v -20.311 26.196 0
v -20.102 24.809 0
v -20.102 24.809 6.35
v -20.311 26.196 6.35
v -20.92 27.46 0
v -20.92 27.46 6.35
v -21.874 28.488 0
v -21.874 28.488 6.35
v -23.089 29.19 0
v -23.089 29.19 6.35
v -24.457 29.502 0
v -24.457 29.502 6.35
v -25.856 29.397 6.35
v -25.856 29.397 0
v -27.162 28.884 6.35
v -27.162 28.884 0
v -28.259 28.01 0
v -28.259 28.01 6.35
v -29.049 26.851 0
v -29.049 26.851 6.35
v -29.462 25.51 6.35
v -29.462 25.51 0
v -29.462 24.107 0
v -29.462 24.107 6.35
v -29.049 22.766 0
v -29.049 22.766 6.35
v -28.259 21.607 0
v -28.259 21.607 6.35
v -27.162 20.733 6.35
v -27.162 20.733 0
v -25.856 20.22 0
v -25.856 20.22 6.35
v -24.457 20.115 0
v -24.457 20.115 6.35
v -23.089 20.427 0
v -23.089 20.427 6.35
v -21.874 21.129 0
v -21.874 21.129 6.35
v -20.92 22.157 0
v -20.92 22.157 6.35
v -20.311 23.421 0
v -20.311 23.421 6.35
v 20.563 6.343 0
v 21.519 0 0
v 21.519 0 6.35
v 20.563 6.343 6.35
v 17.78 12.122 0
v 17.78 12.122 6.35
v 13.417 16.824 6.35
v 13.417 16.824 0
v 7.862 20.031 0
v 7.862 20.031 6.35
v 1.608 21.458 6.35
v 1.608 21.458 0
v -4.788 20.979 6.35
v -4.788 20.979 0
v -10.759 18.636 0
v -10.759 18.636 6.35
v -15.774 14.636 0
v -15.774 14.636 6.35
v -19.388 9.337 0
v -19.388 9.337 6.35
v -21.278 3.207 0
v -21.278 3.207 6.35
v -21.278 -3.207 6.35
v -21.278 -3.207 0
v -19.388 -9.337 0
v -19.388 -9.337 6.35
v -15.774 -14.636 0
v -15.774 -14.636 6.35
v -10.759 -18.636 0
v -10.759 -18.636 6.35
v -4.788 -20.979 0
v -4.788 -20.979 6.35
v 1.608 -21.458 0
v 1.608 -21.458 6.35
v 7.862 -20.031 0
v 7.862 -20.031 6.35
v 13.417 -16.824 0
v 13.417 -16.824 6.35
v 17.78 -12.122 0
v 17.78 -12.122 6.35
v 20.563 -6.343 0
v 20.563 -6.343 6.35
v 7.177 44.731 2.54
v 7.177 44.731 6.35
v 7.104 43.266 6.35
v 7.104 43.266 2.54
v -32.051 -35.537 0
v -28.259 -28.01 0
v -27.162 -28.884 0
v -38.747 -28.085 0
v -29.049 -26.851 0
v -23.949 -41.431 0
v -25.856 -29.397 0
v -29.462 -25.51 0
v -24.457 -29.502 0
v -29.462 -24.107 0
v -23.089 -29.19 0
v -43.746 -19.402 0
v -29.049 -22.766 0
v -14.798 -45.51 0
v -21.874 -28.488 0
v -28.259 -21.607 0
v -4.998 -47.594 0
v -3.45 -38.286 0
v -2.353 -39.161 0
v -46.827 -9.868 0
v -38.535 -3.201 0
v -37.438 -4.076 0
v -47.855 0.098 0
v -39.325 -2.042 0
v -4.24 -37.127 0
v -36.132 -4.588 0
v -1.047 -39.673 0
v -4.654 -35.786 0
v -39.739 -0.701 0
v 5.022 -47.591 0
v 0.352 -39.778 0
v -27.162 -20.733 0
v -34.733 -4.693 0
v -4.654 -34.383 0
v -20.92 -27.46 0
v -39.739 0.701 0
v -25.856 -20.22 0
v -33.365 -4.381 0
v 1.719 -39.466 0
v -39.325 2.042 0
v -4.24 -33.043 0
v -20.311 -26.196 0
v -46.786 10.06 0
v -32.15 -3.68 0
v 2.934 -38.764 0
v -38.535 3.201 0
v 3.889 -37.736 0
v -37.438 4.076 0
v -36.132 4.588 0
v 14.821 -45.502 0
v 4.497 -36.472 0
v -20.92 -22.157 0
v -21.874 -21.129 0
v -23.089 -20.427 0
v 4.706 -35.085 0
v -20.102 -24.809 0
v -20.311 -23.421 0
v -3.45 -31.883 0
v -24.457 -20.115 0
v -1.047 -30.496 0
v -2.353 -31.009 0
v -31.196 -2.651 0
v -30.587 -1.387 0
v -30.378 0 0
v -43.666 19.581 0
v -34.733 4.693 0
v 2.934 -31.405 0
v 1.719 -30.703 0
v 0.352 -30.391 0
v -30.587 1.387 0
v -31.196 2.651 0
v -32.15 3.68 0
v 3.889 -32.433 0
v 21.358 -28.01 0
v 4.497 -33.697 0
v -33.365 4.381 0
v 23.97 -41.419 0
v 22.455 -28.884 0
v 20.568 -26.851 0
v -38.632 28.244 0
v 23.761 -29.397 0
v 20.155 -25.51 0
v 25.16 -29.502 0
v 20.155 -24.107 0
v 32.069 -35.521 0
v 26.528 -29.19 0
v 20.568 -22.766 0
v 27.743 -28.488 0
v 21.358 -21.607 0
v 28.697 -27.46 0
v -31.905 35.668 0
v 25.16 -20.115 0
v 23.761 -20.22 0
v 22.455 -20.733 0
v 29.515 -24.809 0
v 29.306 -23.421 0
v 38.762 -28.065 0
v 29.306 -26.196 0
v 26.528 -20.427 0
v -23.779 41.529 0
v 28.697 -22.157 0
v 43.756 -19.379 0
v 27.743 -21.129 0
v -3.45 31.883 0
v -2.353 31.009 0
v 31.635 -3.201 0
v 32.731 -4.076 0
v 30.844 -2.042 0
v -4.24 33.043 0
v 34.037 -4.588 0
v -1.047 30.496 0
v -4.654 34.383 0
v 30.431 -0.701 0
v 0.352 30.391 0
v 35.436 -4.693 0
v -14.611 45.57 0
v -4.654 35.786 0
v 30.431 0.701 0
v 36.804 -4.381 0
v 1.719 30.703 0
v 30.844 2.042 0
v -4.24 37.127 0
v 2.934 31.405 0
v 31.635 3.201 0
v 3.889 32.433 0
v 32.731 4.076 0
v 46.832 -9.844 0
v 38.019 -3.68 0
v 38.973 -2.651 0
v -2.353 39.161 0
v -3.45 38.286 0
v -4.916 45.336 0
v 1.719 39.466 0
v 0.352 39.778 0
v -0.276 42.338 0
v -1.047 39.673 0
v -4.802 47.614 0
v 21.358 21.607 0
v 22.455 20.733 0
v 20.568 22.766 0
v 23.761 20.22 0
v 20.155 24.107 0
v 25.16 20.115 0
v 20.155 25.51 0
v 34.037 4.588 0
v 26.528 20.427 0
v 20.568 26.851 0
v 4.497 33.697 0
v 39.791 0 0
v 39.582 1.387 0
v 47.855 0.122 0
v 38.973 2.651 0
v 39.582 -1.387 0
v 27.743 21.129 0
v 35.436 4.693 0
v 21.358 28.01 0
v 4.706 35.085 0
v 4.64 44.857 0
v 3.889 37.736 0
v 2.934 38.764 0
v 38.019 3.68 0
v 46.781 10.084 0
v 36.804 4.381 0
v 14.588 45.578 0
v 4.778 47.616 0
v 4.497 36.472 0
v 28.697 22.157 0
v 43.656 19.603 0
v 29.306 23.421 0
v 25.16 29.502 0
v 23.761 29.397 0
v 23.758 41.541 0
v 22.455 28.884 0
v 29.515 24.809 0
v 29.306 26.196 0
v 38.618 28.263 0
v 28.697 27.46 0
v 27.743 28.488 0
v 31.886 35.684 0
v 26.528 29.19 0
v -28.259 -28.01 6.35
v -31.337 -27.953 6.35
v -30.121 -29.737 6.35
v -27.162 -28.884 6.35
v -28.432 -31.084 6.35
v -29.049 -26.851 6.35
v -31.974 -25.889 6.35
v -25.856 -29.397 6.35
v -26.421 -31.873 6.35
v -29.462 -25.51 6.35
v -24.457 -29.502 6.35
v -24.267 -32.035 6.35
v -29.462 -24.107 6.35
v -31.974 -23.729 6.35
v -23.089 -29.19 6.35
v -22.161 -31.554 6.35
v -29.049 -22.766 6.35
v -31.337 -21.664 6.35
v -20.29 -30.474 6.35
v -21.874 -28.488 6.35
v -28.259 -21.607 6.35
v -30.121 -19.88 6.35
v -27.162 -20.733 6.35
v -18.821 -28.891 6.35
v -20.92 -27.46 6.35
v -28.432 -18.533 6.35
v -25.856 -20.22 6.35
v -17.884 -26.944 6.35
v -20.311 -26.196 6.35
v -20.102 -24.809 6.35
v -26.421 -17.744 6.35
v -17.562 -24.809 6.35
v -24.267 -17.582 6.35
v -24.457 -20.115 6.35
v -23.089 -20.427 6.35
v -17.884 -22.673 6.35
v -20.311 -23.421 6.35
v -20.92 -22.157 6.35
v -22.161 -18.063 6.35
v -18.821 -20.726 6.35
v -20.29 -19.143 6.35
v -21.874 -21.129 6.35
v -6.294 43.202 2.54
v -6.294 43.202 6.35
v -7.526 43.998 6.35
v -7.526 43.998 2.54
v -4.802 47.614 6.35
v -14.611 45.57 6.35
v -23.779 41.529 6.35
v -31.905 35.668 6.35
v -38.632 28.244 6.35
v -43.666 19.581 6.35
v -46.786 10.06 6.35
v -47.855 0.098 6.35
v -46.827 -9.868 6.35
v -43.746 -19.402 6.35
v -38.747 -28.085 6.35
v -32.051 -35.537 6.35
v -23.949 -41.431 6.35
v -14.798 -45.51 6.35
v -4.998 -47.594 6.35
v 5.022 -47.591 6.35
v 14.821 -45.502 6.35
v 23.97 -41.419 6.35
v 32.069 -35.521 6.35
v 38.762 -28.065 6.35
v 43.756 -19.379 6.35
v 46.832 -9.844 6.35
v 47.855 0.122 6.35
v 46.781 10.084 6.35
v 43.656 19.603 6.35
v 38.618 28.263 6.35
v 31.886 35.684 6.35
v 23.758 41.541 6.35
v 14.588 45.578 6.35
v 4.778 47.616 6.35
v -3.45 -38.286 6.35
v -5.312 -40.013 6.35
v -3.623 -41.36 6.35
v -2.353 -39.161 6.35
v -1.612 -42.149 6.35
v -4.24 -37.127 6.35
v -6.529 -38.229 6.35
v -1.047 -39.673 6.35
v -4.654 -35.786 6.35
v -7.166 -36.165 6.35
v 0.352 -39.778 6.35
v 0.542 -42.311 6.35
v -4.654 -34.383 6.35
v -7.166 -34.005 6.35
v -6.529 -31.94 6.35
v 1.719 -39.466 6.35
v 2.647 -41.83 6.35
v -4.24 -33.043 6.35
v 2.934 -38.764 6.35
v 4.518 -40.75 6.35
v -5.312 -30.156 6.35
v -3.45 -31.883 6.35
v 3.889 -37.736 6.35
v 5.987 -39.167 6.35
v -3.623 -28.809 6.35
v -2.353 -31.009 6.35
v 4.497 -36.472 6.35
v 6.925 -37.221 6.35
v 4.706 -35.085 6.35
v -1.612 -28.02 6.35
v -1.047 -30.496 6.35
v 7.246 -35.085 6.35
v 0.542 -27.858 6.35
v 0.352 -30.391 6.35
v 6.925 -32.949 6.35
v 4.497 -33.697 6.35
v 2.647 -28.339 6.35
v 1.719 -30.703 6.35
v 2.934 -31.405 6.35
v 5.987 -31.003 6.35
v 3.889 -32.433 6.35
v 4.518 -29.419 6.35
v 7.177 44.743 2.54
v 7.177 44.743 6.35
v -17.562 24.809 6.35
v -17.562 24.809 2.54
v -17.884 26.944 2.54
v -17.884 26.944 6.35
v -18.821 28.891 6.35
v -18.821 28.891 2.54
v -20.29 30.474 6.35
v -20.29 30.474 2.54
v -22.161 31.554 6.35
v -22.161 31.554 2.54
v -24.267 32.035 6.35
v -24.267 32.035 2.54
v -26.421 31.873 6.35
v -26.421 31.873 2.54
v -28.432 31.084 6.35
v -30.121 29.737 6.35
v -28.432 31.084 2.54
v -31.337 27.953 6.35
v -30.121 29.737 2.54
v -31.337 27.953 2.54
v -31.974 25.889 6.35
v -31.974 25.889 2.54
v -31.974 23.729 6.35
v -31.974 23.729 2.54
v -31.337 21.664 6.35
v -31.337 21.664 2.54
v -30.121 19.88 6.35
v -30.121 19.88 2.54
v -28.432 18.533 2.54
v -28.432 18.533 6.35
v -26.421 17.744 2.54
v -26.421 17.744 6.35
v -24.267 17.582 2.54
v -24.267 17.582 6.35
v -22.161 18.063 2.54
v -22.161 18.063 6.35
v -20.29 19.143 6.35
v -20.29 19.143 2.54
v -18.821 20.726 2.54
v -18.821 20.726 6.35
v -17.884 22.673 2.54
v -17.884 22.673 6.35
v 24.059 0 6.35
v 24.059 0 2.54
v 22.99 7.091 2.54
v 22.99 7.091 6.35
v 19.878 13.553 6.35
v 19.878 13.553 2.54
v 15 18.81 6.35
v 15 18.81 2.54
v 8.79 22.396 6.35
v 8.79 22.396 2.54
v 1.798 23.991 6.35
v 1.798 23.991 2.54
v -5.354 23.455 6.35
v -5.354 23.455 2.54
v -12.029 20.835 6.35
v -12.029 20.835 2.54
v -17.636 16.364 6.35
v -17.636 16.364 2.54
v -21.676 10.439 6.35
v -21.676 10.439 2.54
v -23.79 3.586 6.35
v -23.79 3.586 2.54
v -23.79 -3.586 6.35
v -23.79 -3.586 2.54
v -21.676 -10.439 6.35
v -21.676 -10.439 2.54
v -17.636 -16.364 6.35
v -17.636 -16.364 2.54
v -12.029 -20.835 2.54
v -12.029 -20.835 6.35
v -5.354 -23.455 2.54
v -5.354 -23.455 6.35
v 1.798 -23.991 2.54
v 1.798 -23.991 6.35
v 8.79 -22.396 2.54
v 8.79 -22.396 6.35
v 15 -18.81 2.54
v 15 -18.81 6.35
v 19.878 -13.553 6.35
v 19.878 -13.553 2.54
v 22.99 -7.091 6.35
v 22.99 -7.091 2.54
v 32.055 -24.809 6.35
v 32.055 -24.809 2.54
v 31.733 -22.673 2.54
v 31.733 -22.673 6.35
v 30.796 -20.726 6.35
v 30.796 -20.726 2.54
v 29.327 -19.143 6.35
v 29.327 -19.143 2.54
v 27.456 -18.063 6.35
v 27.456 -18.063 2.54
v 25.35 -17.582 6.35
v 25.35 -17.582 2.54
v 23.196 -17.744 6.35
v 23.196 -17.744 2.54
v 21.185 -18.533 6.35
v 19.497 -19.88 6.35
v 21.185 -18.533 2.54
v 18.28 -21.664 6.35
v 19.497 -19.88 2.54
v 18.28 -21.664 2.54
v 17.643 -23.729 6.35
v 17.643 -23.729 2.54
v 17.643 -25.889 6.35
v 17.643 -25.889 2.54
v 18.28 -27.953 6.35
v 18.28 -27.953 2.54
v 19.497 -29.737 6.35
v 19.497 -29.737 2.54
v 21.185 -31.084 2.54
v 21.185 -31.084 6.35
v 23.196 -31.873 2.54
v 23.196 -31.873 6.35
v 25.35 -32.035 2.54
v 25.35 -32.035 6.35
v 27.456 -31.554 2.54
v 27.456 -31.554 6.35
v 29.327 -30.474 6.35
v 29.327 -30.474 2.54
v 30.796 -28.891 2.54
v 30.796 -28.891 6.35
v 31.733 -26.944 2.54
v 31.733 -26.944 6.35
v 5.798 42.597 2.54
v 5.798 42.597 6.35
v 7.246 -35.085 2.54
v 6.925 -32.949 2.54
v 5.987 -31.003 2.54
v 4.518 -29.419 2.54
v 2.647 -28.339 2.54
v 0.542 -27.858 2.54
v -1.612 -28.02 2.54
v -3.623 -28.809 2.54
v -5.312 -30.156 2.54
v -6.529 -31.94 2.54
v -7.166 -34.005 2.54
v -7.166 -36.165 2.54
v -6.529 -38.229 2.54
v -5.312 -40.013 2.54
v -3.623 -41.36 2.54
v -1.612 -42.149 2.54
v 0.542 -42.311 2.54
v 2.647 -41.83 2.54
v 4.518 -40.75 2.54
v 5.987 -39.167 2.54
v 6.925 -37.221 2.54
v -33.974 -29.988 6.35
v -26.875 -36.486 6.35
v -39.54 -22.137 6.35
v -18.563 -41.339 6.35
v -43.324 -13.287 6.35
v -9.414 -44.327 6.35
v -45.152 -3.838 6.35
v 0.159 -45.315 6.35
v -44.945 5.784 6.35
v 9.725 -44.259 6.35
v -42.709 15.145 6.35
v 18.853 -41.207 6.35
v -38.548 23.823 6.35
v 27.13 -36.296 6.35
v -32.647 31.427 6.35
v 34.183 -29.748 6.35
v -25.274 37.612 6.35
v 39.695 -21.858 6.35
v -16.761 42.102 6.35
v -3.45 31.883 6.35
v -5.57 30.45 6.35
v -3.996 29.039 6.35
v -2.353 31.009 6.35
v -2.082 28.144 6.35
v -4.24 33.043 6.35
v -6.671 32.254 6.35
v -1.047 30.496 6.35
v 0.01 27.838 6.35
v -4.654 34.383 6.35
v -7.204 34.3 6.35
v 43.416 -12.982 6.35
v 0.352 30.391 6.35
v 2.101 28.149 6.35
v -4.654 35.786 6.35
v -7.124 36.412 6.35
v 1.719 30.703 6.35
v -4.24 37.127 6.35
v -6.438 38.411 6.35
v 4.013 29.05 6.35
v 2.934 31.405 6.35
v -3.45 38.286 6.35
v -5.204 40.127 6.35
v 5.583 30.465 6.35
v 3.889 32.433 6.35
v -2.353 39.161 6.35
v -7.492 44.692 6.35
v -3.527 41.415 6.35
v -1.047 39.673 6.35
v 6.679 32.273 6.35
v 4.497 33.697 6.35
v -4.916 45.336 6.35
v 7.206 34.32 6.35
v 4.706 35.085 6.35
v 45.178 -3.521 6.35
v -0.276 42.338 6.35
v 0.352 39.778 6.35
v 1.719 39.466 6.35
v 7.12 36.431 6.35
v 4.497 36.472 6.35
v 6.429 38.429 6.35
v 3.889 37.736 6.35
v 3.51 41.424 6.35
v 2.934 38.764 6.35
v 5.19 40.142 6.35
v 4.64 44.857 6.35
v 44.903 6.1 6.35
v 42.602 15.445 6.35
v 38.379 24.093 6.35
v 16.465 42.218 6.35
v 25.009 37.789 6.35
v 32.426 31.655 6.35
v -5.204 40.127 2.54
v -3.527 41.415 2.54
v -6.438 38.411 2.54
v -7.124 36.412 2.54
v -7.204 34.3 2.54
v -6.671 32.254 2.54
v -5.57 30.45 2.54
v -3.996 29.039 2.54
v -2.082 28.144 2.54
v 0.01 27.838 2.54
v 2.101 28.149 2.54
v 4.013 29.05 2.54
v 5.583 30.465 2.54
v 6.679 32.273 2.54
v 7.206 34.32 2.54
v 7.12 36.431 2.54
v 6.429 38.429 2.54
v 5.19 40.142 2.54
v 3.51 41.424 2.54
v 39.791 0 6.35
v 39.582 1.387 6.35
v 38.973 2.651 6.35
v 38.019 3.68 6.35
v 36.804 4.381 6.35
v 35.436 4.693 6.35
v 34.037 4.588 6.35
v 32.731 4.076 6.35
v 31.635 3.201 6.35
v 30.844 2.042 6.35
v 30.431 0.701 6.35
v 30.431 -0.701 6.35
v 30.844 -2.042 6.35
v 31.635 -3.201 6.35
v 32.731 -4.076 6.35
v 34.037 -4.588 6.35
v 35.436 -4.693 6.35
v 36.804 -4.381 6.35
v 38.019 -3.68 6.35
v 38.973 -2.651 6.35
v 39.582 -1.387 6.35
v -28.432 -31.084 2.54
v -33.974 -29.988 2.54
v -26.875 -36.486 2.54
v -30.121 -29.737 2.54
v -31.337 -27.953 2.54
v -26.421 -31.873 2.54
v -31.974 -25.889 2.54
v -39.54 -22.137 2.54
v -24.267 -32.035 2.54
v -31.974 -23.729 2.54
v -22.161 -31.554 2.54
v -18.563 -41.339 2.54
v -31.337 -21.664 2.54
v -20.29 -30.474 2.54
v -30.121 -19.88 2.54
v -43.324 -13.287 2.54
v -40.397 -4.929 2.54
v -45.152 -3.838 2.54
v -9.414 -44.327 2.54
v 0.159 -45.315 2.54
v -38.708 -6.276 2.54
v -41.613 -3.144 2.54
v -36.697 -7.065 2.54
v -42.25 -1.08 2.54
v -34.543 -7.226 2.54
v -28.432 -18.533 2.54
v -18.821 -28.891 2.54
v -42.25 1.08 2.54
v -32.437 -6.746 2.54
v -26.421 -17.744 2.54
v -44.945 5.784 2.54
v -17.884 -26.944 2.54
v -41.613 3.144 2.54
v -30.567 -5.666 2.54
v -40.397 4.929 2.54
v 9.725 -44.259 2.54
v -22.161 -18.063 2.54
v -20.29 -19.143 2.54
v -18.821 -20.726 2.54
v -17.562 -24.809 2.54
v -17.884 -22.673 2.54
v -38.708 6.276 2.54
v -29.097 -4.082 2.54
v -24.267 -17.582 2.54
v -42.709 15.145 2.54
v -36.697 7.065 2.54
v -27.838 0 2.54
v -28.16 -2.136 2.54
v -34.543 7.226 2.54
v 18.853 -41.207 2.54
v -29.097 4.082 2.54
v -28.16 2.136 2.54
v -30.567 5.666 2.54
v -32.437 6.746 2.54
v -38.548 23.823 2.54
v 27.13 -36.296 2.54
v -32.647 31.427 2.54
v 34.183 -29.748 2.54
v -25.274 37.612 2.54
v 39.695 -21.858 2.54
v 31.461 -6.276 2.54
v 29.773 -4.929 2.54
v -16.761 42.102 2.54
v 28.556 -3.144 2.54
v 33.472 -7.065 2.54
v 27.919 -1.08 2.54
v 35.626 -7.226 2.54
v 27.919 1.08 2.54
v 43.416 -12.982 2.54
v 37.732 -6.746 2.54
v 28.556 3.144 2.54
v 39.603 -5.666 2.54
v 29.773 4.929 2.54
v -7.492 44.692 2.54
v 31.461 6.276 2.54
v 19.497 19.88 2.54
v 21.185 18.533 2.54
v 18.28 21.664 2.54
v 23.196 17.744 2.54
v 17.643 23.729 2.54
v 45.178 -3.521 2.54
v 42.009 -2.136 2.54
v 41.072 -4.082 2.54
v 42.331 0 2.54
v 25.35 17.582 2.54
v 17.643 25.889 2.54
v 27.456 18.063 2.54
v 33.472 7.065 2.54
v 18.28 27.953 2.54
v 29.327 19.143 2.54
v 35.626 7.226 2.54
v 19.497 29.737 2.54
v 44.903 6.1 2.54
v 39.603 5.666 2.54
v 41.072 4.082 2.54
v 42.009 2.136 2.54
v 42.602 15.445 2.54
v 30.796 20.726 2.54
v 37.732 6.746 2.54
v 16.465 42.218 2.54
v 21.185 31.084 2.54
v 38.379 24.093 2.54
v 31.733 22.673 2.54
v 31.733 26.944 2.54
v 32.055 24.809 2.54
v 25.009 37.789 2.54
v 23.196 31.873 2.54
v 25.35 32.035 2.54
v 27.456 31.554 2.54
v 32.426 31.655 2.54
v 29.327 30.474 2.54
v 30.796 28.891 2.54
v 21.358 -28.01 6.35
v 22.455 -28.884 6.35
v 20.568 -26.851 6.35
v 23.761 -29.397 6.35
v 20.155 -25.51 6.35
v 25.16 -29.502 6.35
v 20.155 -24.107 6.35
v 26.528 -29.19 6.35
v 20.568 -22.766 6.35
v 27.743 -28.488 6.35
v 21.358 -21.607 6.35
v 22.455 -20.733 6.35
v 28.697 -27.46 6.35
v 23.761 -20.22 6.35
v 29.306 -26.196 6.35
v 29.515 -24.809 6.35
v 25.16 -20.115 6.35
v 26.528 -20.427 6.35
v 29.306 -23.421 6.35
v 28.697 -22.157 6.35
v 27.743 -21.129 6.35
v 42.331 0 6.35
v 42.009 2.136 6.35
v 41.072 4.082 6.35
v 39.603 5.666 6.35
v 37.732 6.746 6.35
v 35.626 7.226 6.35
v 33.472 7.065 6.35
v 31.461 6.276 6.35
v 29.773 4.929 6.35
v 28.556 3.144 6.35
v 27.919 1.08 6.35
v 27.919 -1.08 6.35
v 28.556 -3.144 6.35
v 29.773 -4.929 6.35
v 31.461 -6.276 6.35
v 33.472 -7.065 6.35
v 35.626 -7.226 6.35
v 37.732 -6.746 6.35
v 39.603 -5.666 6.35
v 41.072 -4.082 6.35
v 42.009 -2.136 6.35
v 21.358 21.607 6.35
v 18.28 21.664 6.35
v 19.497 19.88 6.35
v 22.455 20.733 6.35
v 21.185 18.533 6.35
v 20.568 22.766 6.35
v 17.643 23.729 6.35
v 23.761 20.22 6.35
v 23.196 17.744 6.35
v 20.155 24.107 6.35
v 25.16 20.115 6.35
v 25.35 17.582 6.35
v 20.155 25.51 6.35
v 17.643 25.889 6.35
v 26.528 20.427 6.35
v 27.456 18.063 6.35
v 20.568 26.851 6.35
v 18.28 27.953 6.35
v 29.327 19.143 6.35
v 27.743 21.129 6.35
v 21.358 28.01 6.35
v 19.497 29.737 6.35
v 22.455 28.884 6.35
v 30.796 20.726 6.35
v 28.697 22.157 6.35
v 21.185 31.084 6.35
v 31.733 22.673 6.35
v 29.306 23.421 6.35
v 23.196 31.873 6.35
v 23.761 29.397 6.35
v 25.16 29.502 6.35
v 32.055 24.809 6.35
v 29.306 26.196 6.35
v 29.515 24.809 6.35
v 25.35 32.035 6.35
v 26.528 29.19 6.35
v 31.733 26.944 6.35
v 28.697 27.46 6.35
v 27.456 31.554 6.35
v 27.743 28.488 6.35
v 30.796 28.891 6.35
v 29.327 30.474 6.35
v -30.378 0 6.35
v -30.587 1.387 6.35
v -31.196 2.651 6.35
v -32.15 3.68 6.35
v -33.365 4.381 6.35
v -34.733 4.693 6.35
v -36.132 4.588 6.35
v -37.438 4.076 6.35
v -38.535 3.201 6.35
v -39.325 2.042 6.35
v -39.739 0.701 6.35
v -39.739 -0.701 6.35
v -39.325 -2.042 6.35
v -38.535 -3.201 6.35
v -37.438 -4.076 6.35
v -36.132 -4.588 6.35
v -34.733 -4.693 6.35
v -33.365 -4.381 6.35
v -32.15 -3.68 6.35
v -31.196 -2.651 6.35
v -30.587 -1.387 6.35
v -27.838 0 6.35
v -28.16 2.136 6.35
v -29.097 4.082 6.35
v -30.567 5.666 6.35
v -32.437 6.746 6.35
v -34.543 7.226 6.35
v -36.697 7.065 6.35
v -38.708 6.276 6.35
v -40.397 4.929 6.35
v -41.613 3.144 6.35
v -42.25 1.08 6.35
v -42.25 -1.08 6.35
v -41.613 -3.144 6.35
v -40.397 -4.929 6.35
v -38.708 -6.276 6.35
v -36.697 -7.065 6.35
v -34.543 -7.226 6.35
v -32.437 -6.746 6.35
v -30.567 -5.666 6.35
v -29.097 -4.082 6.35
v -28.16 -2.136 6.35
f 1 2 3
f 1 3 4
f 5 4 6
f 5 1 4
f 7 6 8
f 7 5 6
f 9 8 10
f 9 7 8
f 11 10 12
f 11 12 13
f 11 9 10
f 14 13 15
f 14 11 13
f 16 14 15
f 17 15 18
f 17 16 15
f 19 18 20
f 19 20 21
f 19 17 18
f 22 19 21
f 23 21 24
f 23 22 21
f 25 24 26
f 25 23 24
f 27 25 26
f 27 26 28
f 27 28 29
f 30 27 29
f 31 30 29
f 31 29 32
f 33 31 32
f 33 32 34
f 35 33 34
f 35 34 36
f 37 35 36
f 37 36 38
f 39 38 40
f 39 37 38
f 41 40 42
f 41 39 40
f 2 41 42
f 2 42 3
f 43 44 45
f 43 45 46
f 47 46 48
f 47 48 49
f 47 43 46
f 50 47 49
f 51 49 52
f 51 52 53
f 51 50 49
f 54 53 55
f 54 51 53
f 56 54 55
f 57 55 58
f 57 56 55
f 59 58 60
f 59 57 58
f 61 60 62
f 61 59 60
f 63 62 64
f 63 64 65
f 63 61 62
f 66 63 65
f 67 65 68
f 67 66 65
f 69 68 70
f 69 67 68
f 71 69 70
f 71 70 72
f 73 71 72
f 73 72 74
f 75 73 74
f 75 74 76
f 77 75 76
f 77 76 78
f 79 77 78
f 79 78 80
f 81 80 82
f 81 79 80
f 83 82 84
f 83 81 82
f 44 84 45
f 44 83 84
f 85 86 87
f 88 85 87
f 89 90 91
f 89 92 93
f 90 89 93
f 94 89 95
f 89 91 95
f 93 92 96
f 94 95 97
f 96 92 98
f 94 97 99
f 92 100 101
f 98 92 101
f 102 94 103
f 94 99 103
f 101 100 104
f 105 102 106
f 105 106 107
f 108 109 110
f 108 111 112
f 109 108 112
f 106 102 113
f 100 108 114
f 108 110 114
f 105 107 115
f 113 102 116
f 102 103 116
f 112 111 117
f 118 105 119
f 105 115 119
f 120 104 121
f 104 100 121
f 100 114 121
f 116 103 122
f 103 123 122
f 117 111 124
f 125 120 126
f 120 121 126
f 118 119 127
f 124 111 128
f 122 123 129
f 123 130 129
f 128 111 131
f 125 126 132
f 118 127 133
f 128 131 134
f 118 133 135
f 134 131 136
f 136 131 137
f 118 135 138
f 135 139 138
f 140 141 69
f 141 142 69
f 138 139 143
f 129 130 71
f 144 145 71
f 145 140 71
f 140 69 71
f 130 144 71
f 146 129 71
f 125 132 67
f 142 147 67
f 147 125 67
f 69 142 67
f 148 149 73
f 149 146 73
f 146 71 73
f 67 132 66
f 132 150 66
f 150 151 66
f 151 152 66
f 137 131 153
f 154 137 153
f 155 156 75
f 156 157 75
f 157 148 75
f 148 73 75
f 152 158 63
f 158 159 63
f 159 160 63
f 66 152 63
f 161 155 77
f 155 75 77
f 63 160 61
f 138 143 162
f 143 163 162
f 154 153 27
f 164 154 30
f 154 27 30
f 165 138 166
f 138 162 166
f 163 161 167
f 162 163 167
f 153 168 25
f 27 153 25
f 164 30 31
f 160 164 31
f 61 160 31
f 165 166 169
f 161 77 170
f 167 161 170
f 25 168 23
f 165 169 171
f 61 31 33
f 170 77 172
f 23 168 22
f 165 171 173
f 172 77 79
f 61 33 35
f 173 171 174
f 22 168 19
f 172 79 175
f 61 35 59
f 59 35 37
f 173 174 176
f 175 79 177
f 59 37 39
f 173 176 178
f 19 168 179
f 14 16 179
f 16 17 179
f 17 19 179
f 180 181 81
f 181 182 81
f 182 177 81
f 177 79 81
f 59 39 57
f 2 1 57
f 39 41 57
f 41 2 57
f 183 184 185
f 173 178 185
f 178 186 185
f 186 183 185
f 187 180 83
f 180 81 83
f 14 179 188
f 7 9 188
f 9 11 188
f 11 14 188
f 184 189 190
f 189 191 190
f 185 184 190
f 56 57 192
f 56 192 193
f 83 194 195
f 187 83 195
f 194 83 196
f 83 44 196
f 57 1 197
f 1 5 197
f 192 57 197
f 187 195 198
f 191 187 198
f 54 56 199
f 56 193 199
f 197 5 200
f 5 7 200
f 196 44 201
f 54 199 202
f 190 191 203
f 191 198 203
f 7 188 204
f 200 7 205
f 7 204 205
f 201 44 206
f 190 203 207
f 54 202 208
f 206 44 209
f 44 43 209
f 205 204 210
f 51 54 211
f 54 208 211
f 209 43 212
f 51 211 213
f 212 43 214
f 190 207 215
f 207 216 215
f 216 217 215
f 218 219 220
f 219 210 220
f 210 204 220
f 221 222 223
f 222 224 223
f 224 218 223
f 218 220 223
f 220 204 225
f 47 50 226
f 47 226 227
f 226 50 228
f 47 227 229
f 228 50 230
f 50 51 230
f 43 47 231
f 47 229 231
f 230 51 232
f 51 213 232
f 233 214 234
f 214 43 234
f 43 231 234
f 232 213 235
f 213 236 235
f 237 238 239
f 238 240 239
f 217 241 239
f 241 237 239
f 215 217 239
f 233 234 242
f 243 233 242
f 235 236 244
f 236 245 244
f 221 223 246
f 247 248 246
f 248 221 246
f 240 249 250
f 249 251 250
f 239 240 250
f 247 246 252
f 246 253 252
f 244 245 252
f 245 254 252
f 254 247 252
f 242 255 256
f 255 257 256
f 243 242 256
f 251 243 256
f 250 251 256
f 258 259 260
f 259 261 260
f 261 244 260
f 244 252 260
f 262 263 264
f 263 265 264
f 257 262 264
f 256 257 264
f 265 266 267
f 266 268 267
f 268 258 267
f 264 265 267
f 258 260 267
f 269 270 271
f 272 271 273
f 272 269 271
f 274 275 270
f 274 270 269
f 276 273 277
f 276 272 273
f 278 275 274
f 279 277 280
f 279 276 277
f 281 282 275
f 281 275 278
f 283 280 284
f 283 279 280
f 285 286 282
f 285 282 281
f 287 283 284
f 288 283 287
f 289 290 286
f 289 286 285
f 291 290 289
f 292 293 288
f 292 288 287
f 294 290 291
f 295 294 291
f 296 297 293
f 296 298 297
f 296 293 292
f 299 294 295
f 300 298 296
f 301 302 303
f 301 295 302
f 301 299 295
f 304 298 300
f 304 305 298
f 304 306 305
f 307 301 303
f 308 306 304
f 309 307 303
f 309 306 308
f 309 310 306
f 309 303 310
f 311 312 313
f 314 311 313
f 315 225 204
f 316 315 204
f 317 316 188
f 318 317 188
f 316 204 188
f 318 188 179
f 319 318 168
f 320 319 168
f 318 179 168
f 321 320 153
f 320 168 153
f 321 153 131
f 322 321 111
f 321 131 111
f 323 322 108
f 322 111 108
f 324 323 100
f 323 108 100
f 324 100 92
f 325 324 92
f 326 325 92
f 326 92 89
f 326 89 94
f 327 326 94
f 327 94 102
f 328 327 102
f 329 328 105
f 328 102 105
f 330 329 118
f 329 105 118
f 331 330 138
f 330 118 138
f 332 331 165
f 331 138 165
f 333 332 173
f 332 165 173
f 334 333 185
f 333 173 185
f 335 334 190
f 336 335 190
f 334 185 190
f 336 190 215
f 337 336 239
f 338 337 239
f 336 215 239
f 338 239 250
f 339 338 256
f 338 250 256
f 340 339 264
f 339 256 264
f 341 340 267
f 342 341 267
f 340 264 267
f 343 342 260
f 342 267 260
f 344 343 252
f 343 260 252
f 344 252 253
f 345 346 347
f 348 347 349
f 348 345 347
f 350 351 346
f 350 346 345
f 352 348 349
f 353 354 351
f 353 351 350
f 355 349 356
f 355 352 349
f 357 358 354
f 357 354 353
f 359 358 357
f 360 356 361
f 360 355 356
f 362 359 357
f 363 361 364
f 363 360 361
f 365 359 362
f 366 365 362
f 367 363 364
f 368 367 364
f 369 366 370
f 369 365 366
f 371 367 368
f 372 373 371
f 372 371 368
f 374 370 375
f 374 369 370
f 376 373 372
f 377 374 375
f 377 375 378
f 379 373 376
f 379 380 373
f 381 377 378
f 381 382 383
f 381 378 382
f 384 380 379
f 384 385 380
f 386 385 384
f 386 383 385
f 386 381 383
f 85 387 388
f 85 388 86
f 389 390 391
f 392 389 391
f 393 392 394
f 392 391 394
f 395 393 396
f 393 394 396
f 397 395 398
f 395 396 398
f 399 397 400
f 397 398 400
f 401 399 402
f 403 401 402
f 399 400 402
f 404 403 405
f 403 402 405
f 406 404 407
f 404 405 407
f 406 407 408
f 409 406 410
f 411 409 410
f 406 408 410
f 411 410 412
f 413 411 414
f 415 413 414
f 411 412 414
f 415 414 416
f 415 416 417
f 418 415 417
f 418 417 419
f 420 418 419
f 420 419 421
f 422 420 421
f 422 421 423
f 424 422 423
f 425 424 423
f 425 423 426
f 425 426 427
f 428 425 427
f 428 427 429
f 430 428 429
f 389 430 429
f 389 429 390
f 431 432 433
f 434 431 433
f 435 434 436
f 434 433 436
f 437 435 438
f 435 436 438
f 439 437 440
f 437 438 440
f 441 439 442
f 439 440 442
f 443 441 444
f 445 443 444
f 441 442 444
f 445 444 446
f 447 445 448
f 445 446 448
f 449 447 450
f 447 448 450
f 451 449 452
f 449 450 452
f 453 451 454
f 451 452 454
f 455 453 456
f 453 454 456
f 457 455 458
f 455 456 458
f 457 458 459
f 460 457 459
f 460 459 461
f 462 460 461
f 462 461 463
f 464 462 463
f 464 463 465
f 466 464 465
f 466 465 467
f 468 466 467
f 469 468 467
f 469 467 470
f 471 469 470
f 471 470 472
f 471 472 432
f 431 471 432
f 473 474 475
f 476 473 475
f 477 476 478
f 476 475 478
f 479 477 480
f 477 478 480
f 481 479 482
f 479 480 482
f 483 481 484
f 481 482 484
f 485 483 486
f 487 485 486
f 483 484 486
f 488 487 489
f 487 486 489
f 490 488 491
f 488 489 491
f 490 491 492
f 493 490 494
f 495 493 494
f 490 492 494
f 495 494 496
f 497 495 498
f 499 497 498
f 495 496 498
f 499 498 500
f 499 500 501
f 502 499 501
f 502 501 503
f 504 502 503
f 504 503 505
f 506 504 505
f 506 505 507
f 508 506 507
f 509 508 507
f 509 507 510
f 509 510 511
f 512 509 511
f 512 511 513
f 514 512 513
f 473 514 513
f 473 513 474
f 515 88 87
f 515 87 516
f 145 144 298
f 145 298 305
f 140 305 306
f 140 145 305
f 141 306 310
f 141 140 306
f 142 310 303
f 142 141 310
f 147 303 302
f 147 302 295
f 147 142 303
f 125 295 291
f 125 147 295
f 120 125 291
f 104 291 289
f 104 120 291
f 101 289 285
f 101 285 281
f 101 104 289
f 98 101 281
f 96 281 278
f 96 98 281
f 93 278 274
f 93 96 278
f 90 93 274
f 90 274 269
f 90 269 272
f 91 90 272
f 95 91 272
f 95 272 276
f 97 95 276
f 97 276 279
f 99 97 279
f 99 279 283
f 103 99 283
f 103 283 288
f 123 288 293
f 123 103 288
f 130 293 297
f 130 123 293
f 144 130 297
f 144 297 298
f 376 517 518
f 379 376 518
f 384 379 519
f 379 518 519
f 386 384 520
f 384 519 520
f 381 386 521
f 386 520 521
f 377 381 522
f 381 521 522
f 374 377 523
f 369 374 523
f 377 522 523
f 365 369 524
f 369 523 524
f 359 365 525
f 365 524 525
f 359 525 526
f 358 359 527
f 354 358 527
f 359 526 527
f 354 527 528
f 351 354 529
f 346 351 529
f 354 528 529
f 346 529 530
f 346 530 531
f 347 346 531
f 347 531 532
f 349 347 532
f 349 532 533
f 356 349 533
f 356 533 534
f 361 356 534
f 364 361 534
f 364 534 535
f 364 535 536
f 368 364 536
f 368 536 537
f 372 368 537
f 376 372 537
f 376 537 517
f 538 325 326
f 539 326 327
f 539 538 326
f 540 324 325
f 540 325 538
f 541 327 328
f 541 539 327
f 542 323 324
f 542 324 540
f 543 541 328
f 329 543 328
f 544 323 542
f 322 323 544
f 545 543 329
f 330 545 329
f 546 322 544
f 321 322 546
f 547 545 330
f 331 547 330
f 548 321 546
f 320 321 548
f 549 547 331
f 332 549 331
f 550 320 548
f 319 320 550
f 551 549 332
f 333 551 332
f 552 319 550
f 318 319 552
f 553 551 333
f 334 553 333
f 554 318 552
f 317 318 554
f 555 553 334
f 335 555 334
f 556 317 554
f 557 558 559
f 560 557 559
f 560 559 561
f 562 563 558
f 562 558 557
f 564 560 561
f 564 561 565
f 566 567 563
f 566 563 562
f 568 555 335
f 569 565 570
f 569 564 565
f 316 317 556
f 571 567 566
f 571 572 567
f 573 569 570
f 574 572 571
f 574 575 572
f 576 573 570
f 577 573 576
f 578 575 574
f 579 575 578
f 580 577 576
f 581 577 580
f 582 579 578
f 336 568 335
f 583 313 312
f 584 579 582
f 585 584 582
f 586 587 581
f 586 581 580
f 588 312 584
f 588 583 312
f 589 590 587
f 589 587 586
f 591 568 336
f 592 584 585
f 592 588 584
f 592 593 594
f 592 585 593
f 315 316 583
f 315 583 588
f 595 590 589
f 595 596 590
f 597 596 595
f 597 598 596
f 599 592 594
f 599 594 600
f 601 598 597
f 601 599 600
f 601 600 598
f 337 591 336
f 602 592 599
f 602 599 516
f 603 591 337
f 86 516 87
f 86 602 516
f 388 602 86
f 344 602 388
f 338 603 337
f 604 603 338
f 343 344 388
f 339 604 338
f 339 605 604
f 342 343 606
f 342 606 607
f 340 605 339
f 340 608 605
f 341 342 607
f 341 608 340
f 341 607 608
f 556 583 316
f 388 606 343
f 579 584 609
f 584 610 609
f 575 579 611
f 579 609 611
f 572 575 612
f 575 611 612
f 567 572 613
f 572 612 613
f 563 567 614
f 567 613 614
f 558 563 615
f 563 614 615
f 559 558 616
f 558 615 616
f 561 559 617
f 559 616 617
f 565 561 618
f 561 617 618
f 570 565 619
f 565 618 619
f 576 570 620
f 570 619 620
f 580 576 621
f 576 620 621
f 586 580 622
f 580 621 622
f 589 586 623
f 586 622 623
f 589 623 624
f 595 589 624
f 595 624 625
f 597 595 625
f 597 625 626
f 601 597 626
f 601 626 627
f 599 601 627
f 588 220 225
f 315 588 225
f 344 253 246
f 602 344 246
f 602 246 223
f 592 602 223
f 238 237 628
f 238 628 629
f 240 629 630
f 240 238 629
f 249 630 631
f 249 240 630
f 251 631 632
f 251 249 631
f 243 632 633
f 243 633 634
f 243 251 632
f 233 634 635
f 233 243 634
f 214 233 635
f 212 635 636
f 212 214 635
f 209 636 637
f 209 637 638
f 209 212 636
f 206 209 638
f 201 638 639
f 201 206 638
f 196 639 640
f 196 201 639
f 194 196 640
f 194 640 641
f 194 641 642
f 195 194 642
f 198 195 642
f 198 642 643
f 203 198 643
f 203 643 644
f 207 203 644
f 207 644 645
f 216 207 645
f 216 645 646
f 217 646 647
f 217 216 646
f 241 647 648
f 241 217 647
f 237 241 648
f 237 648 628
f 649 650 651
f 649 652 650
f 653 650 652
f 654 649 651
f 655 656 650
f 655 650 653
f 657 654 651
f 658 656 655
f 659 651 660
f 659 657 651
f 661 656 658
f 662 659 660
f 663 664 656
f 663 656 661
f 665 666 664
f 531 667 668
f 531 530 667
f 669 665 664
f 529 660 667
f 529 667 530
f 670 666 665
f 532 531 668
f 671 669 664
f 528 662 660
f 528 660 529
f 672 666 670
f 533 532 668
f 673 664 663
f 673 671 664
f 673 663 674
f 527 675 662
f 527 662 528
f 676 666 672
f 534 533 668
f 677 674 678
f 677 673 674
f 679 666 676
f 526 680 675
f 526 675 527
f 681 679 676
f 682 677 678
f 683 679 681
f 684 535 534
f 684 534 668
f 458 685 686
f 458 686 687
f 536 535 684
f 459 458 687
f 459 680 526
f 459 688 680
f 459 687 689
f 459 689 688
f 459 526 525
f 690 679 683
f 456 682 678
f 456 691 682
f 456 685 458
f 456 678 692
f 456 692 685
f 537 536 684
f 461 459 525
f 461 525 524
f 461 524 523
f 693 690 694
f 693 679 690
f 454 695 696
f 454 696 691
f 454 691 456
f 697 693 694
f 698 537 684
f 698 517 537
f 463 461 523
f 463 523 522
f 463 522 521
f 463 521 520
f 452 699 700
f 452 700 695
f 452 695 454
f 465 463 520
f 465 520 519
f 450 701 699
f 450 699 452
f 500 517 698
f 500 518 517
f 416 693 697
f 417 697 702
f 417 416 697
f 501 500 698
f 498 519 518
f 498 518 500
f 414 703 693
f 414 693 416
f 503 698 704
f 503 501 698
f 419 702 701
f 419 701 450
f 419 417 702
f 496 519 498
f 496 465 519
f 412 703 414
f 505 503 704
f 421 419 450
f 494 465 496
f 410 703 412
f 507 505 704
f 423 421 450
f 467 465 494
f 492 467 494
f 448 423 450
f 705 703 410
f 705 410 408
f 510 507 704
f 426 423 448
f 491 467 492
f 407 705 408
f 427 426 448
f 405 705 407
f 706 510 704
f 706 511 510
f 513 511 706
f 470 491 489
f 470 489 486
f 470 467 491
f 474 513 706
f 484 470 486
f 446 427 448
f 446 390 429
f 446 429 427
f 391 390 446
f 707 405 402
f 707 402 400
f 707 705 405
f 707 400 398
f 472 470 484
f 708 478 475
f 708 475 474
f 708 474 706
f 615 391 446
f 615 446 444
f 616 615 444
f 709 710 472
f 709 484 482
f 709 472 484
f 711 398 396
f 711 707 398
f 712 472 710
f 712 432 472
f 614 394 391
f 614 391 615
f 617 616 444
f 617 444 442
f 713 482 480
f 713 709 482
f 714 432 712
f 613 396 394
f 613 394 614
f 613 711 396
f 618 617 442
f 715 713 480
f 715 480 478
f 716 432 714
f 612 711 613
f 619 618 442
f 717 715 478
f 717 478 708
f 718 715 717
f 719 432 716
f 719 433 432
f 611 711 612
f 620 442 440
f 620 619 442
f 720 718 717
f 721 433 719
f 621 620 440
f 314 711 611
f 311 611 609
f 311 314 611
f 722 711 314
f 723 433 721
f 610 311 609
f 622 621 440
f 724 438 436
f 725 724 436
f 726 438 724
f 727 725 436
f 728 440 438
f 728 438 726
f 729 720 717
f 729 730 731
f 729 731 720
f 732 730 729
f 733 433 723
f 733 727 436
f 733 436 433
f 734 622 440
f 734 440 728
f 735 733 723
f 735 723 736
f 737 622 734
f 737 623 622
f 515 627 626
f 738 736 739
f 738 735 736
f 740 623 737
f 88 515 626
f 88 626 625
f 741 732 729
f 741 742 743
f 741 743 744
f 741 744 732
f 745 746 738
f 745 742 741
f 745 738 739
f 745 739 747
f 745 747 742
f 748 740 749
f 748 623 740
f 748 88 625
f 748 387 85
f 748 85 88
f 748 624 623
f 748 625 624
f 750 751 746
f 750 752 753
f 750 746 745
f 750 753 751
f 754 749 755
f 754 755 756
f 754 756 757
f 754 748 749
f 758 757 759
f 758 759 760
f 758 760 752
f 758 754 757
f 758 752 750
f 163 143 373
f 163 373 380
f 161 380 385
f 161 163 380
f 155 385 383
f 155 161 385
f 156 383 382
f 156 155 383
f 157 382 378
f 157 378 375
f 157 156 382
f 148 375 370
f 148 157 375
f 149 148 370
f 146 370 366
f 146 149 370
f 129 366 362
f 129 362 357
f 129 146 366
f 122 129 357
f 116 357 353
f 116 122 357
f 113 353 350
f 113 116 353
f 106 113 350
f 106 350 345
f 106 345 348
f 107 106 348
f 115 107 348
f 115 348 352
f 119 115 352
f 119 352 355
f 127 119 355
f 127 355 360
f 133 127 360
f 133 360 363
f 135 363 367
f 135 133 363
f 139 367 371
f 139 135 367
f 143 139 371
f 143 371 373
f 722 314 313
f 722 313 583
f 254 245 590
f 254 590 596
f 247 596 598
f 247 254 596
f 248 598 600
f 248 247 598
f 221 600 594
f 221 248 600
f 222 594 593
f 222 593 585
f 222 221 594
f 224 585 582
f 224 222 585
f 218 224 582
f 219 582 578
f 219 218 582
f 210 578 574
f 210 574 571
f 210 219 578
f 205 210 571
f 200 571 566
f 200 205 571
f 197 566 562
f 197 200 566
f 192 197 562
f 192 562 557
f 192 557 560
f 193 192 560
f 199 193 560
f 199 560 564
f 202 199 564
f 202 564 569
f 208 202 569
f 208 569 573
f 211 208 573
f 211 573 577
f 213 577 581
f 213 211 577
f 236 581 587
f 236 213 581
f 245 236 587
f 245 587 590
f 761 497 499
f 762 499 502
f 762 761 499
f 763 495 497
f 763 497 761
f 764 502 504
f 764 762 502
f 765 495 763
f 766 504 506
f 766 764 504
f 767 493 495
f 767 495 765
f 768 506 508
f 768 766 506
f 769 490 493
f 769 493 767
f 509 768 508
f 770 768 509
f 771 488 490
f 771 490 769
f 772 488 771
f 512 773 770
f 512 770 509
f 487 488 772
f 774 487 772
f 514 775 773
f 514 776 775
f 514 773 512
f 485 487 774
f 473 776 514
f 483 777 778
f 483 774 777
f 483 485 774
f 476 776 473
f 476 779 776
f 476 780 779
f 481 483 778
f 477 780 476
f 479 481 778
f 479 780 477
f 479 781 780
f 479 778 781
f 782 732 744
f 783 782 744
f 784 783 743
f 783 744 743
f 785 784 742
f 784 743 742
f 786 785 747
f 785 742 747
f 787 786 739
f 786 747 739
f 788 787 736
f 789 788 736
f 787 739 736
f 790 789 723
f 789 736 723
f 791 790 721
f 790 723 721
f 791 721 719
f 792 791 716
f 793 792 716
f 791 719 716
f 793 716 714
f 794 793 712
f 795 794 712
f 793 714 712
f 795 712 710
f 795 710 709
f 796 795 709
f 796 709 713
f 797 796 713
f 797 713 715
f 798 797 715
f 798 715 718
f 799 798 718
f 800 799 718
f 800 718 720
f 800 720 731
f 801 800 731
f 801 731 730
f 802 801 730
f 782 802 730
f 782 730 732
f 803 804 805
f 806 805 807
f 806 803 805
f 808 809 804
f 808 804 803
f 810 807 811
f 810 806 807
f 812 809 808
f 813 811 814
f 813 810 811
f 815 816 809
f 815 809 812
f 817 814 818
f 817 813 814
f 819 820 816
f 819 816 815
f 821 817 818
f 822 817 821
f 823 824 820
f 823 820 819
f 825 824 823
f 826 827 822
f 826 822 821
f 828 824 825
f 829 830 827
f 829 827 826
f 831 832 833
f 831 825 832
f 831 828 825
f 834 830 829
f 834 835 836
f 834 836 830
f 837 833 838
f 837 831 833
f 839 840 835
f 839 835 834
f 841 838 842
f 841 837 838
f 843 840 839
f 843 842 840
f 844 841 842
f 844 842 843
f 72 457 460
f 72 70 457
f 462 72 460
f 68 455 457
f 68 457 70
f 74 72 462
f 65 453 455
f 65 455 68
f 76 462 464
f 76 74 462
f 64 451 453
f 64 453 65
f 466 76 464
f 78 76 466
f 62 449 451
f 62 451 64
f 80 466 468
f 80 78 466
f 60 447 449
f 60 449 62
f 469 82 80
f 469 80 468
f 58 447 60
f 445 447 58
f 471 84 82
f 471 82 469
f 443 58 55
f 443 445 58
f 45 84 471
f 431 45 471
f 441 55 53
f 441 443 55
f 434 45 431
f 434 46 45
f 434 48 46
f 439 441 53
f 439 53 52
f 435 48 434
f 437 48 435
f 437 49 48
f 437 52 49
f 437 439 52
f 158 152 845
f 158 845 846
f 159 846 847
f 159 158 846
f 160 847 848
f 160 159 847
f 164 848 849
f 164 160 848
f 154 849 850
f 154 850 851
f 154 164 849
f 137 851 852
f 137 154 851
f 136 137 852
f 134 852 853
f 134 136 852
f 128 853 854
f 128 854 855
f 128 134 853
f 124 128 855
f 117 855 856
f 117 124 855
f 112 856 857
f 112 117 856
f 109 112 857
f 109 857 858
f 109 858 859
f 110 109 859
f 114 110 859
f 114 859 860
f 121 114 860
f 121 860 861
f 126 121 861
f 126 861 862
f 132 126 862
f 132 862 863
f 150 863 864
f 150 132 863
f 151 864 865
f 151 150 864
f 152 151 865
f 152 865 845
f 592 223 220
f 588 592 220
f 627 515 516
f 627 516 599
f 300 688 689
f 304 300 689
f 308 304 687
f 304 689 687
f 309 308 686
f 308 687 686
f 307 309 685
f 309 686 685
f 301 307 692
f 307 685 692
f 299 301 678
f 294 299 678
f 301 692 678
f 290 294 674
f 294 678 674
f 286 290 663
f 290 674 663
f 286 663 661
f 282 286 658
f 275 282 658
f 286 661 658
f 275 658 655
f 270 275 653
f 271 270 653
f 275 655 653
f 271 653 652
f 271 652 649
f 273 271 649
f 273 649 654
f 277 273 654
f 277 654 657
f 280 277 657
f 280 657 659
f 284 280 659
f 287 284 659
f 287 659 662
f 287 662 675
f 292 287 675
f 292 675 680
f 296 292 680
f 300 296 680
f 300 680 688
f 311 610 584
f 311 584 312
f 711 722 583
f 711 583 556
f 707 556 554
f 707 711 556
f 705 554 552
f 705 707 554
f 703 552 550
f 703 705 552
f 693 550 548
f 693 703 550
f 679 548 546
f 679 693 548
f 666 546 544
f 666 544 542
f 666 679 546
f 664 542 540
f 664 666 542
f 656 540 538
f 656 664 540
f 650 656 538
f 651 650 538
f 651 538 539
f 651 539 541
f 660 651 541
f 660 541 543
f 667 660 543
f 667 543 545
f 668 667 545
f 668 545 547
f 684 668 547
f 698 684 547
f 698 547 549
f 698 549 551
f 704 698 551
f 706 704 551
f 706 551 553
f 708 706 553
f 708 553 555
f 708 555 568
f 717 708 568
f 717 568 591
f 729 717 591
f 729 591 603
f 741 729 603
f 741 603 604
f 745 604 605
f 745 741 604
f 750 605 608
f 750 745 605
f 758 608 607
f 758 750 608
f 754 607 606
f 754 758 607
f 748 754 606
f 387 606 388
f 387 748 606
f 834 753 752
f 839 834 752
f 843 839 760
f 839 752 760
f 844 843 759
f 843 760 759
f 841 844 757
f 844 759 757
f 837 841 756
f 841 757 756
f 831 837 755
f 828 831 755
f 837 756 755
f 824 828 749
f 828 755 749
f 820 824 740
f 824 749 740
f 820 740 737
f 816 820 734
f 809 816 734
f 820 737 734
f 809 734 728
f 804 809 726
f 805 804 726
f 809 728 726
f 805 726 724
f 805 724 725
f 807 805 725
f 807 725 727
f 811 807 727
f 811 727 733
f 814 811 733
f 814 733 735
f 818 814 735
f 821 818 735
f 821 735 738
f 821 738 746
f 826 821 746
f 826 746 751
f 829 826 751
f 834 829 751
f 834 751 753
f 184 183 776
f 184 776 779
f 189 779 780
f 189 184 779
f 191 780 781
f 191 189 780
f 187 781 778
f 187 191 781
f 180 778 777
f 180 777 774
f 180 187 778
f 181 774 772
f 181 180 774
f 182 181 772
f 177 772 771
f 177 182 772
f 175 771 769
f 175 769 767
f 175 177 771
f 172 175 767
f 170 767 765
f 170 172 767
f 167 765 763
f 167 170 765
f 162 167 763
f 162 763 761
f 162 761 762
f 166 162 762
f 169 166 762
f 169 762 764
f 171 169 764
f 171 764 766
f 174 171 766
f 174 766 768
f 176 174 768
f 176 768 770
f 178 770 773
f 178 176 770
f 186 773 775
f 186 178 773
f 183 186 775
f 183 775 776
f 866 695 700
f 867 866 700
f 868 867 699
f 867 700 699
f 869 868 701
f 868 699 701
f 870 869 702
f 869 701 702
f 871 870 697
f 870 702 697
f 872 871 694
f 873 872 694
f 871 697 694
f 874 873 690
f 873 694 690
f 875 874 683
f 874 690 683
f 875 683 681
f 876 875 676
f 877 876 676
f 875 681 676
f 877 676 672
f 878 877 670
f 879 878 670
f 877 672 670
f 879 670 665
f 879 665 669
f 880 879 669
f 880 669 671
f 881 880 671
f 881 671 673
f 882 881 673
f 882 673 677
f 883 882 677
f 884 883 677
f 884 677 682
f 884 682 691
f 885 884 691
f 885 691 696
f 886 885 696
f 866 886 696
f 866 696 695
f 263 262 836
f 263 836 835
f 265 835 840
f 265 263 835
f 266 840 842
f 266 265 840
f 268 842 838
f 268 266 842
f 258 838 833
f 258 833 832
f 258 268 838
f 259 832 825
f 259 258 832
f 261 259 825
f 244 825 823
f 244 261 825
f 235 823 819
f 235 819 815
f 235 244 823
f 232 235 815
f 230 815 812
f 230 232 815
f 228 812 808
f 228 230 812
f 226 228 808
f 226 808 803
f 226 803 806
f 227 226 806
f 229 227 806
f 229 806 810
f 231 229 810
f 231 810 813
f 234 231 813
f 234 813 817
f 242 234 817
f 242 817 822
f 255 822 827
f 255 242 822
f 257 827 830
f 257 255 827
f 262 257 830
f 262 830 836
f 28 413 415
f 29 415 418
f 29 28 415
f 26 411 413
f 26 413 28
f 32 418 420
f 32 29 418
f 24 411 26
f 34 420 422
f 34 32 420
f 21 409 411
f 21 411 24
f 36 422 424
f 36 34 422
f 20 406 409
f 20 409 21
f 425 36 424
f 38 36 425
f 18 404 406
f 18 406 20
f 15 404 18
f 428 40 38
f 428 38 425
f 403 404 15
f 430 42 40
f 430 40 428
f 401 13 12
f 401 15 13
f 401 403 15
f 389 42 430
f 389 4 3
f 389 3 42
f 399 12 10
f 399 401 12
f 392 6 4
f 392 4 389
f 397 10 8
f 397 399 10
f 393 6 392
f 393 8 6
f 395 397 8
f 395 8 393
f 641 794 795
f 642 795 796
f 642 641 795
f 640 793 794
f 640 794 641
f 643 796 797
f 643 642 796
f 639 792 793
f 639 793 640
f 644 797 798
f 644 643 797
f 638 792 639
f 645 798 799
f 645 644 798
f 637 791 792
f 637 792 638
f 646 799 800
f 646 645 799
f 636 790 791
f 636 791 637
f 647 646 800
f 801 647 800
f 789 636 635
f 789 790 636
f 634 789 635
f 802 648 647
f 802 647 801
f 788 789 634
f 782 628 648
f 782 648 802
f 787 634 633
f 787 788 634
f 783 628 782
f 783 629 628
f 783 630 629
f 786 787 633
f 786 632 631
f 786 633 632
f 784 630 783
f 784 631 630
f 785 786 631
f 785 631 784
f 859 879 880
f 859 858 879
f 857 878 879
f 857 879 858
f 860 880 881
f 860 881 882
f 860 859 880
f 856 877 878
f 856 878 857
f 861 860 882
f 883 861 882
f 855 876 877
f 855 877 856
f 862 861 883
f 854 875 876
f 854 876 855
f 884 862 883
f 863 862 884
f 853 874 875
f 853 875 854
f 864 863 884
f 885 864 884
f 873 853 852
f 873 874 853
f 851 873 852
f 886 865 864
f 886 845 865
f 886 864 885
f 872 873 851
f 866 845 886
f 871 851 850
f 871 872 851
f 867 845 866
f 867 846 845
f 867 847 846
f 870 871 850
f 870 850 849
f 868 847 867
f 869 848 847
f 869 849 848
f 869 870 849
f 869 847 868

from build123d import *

# Parameters (mm, degrees)
F0_R        = 4.7064707614
F0_R_2      = 21.5186597363
F1_DEPTH    = 6.35
F2_T        = 2.54
F2_T3_DEPTH = 11.43


# Not quite as in the source:
# - a shell that OpenCascade refuses in one call is made with other operations: the cavity is built on its own and cut out


with BuildPart() as f1:
    # F0 (on Top) → F1 (new body)
    with BuildSketch(Plane.XY):
        with BuildLine():
            Line((-4.9161130278, 45.3357483006), (-4.8021092029, 47.6136840266))
            ThreePointArc((-4.8021092029, 47.6136840266), (0.0120888652, -47.8552297376), (4.7780528964, 47.6161041025))
            Line((4.7780528964, 47.6161041025), (4.639992765, 44.8574939765))
            Line((4.639992765, 44.8574939765), (-0.2761202627, 42.3380110126))
            Line((-0.2761202627, 42.3380110126), (-4.9161130278, 45.3357483006))
        make_face()
        with Locations((-24.80855963, -24.80855963)):
            Circle(F0_R, mode=Mode.SUBTRACT)
        with Locations((0, -35.0846014917)):
            Circle(F0_R, mode=Mode.SUBTRACT)
        with Locations((24.80855963, -24.80855963)):
            Circle(F0_R, mode=Mode.SUBTRACT)
        with Locations((-35.0846014917, 0)):
            Circle(F0_R, mode=Mode.SUBTRACT)
        with Locations((-24.80855963, 24.80855963)):
            Circle(F0_R, mode=Mode.SUBTRACT)
        Circle(F0_R_2, mode=Mode.SUBTRACT)
        with Locations((35.0846014917, 0)):
            Circle(F0_R, mode=Mode.SUBTRACT)
        with Locations((0, 35.0846014917)):
            Circle(F0_R, mode=Mode.SUBTRACT)
        with Locations((24.80855963, 24.80855963)):
            Circle(F0_R, mode=Mode.SUBTRACT)
    extrude(amount=F1_DEPTH)

    # F2: shell of thickness 2.54, made by hand


with BuildPart() as f2_core1:
    # F2_t2: copy of F1
    add(f1.part)

    # the walls: a layer under each face that stays
    f2_faces = [f2_core1.faces().sort_by_distance(p)[0] for p in [
        (-2.5961166453, 43.8368796566, 3.175),
        (-4.8591111154, 46.4747161636, 3.175),
        (0.0120888652, -47.8552297376, 3.175),
        (4.7090228307, 46.2367990395, 3.175),
        (2.1819362512, 43.5977524946, 3.175),
        (-29.5150303914, -24.80855963, 3.175),
        (-4.7064707614, -35.0846014917, 3.175),
        (20.1020888686, -24.80855963, 3.175),
        (-39.7910722531, 0, 3.175),
        (-29.5150303914, 24.80855963, 3.175),
        (-21.5186597363, 0, 3.175),
        (30.3781307302, 0, 3.175),
        (-4.7064707614, 35.0846014917, 3.175),
        (20.1020888686, 24.80855963, 3.175),
        (-31.9034875097, -31.9433420367, 0),
    ]]
    thicken(f2_faces, amount=-F2_T, mode=Mode.SUBTRACT)

    # F2_s4 → F2_t3 (cut)
    with BuildSketch(Plane.XY.offset(-2.54)):
        Polygon((-0.2739212432, 42.3819501104), (-1.6544837368, 40.2045363506), (-0.4227215664, 39.4087378278), (0.8823412559, 40.0775758974), align=None)
        Polygon((-4.8769611431, 45.3558134427), (-6.2944765018, 43.2022736386), (-7.5262386722, 43.9980721614), (-7.4529380204, 45.4627087538), align=None)
        Polygon((4.6030398999, 44.8813679322), (7.1768177577, 44.7305335234), (7.1035171059, 43.265896931), (5.7984542836, 42.5970588614), align=None)
    extrude(amount=F2_T3_DEPTH, mode=Mode.SUBTRACT)


with BuildPart() as f1_1:
    add(f1.part)

    # what is left inside the walls is the cavity
    f2_cavity = [f2_core1.part.solids().sort_by_distance(p)[0] for p in [
        (-22.657616, 14.723726, 2.5654),
    ]]
    add(f2_cavity, mode=Mode.SUBTRACT)


solid = f1_1.part
